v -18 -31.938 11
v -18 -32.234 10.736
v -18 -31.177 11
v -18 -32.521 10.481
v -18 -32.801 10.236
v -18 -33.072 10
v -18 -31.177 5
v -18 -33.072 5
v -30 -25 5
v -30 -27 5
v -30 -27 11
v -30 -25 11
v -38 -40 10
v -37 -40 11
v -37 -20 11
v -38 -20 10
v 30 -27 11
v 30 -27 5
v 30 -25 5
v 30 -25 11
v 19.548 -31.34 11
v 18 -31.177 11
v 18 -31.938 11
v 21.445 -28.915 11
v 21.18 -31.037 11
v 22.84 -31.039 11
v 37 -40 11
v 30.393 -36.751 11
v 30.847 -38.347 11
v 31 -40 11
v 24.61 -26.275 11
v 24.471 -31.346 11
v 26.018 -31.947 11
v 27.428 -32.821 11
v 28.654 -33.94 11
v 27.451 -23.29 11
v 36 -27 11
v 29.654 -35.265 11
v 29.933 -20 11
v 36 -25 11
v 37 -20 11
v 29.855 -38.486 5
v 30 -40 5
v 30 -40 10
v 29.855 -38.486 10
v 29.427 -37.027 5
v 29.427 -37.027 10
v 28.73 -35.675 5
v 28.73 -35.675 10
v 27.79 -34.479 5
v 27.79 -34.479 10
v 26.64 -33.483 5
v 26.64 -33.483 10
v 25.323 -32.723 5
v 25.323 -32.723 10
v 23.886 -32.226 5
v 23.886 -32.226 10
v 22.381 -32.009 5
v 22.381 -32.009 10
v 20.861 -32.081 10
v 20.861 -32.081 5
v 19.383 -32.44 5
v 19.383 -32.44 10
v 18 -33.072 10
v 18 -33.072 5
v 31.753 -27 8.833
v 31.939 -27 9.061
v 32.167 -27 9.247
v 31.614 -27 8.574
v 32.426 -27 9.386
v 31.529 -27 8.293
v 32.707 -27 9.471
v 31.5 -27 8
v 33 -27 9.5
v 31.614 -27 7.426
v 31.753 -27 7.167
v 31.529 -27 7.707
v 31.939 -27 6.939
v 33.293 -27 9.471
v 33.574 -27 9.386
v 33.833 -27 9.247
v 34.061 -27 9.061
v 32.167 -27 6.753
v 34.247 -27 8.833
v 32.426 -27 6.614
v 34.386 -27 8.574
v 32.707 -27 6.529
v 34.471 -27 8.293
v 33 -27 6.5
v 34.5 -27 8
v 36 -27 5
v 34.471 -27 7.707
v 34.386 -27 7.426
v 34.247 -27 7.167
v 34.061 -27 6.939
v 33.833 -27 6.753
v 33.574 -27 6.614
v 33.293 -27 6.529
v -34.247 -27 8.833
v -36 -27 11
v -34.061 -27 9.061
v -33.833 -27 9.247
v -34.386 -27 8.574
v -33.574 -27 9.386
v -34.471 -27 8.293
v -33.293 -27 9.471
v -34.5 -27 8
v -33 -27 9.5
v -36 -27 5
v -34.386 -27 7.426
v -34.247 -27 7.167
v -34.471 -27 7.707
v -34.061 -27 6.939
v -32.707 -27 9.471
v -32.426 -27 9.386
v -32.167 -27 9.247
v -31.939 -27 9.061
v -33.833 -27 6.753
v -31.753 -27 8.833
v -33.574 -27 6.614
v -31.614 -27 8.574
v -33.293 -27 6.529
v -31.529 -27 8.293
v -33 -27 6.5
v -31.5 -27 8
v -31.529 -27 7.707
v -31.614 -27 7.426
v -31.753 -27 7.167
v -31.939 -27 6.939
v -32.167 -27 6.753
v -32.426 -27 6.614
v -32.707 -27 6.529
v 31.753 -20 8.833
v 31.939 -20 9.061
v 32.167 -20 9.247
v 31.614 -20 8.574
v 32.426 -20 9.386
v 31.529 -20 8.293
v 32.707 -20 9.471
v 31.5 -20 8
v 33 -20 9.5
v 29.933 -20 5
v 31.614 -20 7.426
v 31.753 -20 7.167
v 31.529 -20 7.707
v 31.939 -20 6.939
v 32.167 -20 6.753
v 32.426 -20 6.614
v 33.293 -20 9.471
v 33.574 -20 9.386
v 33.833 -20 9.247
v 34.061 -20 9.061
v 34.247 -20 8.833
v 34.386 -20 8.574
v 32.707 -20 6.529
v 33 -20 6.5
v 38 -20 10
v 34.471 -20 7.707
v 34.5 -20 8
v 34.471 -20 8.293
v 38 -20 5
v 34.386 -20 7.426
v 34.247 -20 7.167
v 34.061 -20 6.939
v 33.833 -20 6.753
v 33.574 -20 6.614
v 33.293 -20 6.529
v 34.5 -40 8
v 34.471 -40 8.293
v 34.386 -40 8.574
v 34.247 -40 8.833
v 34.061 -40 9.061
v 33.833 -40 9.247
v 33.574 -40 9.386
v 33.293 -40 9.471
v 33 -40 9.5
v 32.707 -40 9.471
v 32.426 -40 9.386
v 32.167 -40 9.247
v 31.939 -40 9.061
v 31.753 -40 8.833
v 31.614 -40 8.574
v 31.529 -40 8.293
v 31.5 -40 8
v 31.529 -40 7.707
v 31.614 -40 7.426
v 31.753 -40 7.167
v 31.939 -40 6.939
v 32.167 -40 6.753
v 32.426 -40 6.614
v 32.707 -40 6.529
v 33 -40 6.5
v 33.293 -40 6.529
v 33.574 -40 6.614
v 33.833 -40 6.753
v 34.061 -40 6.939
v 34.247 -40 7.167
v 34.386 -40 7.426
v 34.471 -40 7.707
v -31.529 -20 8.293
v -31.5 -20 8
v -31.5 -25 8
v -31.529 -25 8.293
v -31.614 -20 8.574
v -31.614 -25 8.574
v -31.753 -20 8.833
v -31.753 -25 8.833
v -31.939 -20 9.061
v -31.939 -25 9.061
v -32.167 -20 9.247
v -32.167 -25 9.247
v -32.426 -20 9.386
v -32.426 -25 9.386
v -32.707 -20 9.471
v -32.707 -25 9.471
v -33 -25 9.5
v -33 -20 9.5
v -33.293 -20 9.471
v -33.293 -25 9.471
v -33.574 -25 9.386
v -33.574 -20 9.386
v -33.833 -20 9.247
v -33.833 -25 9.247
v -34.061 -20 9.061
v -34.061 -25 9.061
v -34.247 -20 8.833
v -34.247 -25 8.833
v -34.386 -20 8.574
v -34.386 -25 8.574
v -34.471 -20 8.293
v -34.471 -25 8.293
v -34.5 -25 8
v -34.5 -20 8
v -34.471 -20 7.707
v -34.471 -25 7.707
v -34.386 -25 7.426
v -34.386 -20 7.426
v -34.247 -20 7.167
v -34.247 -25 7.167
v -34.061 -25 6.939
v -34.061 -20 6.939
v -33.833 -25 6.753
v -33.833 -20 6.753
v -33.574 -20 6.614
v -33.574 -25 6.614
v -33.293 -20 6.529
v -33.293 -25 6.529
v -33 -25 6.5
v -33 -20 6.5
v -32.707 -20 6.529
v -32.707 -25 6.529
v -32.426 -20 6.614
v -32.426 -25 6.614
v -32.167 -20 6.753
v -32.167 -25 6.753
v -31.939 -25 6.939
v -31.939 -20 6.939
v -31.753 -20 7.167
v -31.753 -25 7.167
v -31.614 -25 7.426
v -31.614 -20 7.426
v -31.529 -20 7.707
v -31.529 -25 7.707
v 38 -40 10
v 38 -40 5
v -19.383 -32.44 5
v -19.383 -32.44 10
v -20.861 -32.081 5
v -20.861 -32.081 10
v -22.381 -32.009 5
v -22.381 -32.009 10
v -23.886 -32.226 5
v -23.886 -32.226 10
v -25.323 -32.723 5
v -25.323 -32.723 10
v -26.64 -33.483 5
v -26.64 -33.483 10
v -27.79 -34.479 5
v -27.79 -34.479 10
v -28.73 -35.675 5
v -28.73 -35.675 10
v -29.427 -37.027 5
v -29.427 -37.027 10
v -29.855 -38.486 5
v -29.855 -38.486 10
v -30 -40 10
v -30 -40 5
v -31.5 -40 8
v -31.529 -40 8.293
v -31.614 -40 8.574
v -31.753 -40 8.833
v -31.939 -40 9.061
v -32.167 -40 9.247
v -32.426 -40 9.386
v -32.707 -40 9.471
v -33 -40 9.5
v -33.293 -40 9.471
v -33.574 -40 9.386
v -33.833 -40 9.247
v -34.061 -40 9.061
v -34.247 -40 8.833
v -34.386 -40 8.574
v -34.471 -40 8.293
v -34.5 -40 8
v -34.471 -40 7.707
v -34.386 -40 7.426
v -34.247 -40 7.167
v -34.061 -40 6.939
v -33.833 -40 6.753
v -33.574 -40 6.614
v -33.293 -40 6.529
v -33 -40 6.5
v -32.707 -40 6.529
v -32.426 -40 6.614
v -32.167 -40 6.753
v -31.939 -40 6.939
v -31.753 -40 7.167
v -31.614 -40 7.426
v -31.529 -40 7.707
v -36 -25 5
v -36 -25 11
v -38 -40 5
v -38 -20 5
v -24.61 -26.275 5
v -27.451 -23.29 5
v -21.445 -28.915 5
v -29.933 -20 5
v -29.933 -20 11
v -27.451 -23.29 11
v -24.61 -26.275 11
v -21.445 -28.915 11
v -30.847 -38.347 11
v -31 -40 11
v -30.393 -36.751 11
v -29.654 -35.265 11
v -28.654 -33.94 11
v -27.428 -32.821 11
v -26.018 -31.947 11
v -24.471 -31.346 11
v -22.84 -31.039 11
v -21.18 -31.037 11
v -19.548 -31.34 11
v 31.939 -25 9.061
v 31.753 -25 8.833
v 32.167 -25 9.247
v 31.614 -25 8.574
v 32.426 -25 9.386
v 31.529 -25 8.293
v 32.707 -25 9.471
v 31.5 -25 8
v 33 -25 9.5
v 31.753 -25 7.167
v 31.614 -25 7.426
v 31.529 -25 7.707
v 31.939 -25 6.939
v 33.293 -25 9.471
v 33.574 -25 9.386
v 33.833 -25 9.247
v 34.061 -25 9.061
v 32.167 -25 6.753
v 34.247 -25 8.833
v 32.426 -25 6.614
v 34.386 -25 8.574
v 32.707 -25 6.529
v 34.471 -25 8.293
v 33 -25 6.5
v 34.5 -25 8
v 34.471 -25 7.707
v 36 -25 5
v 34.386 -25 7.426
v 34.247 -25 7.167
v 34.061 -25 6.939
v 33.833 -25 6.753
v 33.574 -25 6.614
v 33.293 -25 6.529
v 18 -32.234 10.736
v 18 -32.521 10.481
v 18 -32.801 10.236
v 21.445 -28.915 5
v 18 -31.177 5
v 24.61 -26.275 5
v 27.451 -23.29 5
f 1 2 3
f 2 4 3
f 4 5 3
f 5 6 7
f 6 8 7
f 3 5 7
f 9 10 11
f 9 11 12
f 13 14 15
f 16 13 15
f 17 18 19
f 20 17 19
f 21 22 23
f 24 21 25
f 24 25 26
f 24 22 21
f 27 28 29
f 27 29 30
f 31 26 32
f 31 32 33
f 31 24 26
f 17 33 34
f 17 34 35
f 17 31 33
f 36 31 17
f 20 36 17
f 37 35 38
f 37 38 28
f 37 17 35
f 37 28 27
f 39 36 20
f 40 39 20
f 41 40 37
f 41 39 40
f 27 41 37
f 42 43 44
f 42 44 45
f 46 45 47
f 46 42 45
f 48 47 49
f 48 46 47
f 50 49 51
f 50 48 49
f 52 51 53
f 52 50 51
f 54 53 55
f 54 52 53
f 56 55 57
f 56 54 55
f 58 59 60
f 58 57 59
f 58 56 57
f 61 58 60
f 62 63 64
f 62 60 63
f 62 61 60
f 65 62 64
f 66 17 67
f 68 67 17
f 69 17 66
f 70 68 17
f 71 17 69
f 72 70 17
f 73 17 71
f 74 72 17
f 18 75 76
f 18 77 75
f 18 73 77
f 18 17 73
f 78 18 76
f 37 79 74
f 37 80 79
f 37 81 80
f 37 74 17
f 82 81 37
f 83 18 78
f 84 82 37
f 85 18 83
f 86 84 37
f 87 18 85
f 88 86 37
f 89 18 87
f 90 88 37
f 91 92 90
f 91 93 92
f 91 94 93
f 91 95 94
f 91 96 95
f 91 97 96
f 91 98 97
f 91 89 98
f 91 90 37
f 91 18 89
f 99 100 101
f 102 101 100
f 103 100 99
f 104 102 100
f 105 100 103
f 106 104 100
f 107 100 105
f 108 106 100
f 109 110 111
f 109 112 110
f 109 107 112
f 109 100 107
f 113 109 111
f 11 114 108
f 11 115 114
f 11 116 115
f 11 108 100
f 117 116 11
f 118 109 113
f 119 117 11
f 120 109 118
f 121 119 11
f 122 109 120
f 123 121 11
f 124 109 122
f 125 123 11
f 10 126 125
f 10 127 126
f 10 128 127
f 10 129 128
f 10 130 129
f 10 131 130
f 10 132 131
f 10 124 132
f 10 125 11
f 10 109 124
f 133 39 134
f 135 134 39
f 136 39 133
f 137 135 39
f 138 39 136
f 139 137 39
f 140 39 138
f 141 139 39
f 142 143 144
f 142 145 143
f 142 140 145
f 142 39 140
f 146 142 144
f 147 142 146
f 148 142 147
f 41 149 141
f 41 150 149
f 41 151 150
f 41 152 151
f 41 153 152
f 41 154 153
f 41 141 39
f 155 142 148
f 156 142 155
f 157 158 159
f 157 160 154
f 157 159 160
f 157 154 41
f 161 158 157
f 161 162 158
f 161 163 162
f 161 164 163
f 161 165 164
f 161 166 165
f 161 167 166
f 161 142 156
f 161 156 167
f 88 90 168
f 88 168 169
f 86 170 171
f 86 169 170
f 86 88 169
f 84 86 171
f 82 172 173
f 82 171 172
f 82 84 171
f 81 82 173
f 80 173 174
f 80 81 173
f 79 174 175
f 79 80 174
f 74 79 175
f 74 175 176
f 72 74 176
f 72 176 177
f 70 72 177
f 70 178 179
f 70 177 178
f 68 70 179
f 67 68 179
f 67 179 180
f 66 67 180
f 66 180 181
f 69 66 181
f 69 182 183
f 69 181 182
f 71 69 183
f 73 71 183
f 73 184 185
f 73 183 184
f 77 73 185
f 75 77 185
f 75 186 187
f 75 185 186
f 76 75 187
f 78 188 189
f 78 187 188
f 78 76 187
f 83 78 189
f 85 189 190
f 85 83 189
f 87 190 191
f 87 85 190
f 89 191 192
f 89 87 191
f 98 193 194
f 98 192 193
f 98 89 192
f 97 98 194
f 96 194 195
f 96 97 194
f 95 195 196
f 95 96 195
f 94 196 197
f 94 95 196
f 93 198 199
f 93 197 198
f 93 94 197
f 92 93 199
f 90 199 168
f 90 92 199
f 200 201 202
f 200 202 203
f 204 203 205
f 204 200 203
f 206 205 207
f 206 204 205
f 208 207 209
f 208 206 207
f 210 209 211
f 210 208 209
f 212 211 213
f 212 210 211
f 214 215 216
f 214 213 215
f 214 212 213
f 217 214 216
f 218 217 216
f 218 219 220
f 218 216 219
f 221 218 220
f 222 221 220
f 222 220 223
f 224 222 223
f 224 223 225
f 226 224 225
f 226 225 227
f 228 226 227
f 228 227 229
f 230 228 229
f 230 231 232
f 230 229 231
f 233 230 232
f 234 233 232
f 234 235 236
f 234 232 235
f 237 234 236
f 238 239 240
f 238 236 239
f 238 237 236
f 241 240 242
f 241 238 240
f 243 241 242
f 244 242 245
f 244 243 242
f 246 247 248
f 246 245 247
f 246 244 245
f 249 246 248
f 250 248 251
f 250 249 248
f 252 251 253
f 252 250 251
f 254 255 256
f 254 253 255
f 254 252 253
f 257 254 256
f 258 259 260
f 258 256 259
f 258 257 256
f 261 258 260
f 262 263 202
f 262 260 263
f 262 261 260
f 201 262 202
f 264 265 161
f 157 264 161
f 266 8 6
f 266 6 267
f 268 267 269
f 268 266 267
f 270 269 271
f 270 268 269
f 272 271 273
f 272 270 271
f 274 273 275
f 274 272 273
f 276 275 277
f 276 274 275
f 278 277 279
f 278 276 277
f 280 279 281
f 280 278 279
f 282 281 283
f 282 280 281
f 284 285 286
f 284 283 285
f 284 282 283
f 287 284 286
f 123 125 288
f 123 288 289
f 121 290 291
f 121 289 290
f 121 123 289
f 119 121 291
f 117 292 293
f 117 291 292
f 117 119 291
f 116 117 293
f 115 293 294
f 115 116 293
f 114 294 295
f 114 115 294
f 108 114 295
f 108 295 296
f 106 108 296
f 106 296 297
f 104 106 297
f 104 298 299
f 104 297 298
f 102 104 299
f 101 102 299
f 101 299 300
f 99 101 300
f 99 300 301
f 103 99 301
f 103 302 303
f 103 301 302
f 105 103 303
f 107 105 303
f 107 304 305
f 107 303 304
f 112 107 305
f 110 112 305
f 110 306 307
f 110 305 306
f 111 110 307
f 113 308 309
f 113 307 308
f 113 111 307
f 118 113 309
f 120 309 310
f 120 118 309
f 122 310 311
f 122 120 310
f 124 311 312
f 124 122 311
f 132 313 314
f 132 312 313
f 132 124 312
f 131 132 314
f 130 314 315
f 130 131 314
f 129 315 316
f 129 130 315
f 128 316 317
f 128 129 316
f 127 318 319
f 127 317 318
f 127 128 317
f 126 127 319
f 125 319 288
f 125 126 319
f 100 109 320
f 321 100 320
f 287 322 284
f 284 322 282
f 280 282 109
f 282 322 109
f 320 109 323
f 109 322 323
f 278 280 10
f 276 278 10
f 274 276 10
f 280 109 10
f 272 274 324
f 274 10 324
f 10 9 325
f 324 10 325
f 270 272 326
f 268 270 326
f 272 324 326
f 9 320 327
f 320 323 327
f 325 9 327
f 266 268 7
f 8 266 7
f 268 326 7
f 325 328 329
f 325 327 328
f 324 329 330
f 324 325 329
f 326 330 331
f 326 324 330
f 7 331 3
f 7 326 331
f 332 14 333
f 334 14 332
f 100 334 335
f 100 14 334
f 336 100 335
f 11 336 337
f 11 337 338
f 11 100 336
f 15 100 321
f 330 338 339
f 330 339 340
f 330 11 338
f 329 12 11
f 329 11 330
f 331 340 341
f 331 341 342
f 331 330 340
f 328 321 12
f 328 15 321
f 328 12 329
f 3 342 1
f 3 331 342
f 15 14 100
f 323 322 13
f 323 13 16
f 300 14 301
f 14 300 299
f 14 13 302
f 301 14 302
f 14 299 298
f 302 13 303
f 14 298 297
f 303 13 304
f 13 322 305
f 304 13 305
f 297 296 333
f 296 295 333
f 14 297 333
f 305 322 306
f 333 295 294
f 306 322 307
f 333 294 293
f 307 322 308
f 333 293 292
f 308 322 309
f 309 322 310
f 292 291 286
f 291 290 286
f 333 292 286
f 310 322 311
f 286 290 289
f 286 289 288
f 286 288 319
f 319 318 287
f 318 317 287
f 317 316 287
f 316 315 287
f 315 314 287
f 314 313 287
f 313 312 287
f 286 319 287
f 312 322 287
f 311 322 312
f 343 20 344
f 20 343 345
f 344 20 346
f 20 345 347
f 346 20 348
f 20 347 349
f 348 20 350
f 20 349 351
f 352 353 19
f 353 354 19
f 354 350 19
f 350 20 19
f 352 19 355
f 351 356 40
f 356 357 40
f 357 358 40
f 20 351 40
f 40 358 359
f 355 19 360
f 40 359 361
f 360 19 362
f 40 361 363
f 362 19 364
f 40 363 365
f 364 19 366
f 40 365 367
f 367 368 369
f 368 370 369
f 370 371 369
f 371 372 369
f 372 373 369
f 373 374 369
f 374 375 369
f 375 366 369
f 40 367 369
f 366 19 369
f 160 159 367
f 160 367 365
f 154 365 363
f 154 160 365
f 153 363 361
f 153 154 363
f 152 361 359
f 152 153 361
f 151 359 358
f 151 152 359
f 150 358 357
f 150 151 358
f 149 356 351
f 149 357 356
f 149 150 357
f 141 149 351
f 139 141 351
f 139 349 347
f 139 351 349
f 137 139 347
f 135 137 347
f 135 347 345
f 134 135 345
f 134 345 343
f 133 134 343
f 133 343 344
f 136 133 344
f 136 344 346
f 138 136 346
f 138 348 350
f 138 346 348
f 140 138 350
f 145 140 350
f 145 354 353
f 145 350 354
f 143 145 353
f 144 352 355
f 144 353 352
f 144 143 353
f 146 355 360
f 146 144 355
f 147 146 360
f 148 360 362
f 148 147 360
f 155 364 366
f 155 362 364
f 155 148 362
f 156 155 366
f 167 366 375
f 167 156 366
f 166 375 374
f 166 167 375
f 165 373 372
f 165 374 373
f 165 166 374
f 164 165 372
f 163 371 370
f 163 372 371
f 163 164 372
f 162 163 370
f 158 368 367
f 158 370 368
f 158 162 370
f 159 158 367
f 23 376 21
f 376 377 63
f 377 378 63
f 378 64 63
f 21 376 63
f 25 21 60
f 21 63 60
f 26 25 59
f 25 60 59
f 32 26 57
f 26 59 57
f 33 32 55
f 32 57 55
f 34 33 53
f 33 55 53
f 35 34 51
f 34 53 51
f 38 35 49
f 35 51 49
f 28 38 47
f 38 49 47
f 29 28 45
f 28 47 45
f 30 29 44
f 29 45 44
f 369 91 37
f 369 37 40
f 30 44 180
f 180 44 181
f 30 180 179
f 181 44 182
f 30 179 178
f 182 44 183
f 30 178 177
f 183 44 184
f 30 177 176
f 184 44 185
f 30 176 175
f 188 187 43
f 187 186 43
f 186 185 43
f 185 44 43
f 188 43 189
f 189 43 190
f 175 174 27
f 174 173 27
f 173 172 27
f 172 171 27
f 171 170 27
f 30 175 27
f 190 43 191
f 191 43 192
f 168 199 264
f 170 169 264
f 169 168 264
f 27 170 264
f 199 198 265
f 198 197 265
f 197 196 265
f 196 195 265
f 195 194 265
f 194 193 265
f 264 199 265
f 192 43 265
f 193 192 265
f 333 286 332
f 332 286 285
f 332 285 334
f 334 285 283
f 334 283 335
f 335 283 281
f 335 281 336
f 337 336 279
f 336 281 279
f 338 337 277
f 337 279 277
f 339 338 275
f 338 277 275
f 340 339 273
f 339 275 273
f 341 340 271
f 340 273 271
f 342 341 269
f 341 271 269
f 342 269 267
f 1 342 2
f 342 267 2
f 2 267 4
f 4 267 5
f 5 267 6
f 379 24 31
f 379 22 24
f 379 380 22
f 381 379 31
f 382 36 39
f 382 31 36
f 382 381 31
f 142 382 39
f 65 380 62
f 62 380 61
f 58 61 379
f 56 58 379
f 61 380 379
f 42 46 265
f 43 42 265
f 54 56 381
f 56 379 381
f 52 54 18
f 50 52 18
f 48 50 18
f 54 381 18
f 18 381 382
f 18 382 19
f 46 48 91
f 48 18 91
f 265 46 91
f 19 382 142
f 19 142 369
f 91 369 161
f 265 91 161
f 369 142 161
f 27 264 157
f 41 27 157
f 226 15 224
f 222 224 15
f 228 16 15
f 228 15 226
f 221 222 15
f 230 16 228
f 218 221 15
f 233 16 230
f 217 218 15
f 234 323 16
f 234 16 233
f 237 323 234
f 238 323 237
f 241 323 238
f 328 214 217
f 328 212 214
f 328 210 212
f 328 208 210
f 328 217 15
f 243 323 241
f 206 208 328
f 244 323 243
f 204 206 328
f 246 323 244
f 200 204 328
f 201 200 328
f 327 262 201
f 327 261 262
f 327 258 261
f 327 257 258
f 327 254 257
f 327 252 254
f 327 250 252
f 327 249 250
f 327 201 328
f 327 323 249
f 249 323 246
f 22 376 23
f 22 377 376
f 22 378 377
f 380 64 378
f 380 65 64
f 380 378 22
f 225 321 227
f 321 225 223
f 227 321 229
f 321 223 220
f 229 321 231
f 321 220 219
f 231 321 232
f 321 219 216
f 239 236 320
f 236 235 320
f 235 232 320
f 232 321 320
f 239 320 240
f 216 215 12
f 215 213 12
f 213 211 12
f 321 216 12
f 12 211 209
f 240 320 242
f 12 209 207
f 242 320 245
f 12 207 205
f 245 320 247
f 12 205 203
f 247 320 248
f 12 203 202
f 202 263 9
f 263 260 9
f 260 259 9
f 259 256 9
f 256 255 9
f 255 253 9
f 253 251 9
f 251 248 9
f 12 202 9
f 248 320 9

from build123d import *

# Parameters (mm, degrees)
CYLINDER2842_R     = 1.5
CYLINDER2842_DEPTH = 60
CYLINDER2839_R     = 1.5
CYLINDER2839_DEPTH = 60
BOX1062_W          = 6
BOX1062_H          = 2
BOX1062_DEPTH      = 6
BOX1060_W          = 6
BOX1060_H          = 2
BOX1060_DEPTH      = 6
CYLINDER2821_R     = 36
CYLINDER2821_DEPTH = 16
CYLINDER2820_R     = 8
CYLINDER2820_DEPTH = 16
CYLINDER2818_R     = 8
CYLINDER2818_DEPTH = 16
BOX1053_W          = 20
BOX1053_H          = 20
BOX1053_DEPTH      = 6
BOX1056_W          = 20
BOX1056_H          = 20
BOX1056_DEPTH      = 6
CHAMFER148_SIZE    = 1
CHAMFER153_SIZE    = 1
CHAMFER155_SIZE    = 1
CHAMFER152_SIZE    = 1


with BuildPart() as v_lec2812:
    # Cylinder2842 → Cylinder2842 (new body)
    with BuildSketch(Plane(origin=(33, -10, 8), x_dir=(1, 0, 0), z_dir=(0, -1, 0))):
        Circle(CYLINDER2842_R)
    extrude(amount=CYLINDER2842_DEPTH)


with BuildPart() as compound1267:
    # Cylinder2839 → Cylinder2839 (new body)
    with BuildSketch(Plane(origin=(-33, -10, 8), x_dir=(1, 0, 0), z_dir=(0, -1, 0))):
        Circle(CYLINDER2839_R)
    extrude(amount=CYLINDER2839_DEPTH)

    # Compound1267: union Válec2812
    add(v_lec2812.part)


with BuildPart() as compound1267_1:
    # Compound1267 placement: moved
    add(compound1267.part.moved(Location((0, -4, 0))))


with BuildPart() as krychle1061:
    # Box1062 → Box1062 (new body)
    with BuildSketch(Plane(origin=(-36, -27, 5), x_dir=(1, 0, 0), z_dir=(0, 0, 1))):
        with Locations((3, 1)):
            Rectangle(BOX1062_W, BOX1062_H)
    extrude(amount=BOX1062_DEPTH)


with BuildPart() as compound1266:
    # Box1060 → Box1060 (new body)
    with BuildSketch(Plane(origin=(30, -27, 5), x_dir=(1, 0, 0), z_dir=(0, 0, 1))):
        with Locations((3, 1)):
            Rectangle(BOX1060_W, BOX1060_H)
    extrude(amount=BOX1060_DEPTH)

    # Compound1266: union Krychle1061
    add(krychle1061.part)


with BuildPart() as v_lec2791:
    # Cylinder2821 → Cylinder2821 (new body)
    with BuildSketch(Plane.XY):
        Circle(CYLINDER2821_R)
    extrude(amount=CYLINDER2821_DEPTH)


with BuildPart() as v_lec2790:
    # Cylinder2820 → Cylinder2820 (new body)
    with BuildSketch(Plane(origin=(-22, -40, 0), x_dir=(1, 0, 0), z_dir=(0, 0, 1))):
        Circle(CYLINDER2820_R)
    extrude(amount=CYLINDER2820_DEPTH)


with BuildPart() as compound1255:
    # Cylinder2818 → Cylinder2818 (new body)
    with BuildSketch(Plane(origin=(22, -40, 0), x_dir=(1, 0, 0), z_dir=(0, 0, 1))):
        Circle(CYLINDER2818_R)
    extrude(amount=CYLINDER2818_DEPTH)

    # Compound1255: union Válec2790
    add(v_lec2790.part)


with BuildPart() as krychle1052:
    # Box1053 → Box1053 (new body)
    with BuildSketch(Plane(origin=(-38, -40, 5), x_dir=(1, 0, 0), z_dir=(0, 0, 1))):
        with Locations((10, 10)):
            Rectangle(BOX1053_W, BOX1053_H)
    extrude(amount=BOX1053_DEPTH)


with BuildPart() as cut1084:
    # Box1056 → Box1056 (new body)
    with BuildSketch(Plane(origin=(18, -40, 5), x_dir=(1, 0, 0), z_dir=(0, 0, 1))):
        with Locations((10, 10)):
            Rectangle(BOX1056_W, BOX1056_H)
    extrude(amount=BOX1056_DEPTH)

    # Compound1264: union Krychle1052
    add(krychle1052.part)

    # Cut1073: cut Compound1255
    add(compound1255.part, mode=Mode.SUBTRACT)

    # Chamfer148
    chamfer148_edges = [cut1084.edges().sort_by_distance(p)[0] for p in [
        (26, -33.071797, 11),
    ]]
    chamfer(chamfer148_edges, length=CHAMFER148_SIZE)

    # Chamfer153
    chamfer153_edges = [cut1084.edges().sort_by_distance(p)[0] for p in [
        (38, -30, 11),
    ]]
    chamfer(chamfer153_edges, length=CHAMFER153_SIZE)

    # Chamfer155
    chamfer155_edges = [cut1084.edges().sort_by_distance(p)[0] for p in [
        (-38, -30, 11),
    ]]
    chamfer(chamfer155_edges, length=CHAMFER155_SIZE)

    # Chamfer152
    chamfer152_edges = [cut1084.edges().sort_by_distance(p)[0] for p in [
        (-26, -33.071797, 11),
    ]]
    chamfer(chamfer152_edges, length=CHAMFER152_SIZE)

    # Cut1075: cut Válec2791
    add(v_lec2791.part, mode=Mode.SUBTRACT)

    # Cut1071: cut Compound1266
    add(compound1266.part, mode=Mode.SUBTRACT)

    # Cut1084: cut Compound1267
    add(compound1267_1.part, mode=Mode.SUBTRACT)


solid = cut1084.part
